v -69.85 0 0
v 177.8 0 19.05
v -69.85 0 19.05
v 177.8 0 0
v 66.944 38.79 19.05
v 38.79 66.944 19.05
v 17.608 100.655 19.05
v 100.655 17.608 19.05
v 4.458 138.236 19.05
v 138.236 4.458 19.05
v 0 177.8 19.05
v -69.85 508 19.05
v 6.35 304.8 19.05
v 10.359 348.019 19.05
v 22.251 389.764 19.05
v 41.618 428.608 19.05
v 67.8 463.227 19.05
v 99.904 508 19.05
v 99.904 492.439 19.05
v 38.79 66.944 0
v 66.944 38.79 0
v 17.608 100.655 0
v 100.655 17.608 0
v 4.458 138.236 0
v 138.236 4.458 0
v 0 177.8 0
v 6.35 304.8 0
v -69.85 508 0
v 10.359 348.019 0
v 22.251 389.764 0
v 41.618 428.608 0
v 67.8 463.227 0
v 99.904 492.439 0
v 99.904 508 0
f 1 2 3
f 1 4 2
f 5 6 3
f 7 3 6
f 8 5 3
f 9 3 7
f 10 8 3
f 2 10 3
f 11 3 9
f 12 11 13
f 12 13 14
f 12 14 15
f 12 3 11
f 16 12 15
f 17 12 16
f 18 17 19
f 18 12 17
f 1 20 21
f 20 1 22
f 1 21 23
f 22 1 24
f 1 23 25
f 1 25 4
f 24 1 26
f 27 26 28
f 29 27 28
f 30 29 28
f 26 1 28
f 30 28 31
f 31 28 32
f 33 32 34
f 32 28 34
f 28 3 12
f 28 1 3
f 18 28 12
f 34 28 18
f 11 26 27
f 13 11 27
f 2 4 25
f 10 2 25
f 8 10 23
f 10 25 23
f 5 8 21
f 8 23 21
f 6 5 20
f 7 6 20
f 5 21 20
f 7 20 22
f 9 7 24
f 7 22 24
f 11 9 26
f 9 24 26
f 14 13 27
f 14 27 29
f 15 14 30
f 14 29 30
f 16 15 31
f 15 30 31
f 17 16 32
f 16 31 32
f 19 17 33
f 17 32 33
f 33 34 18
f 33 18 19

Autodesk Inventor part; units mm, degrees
ref_plane "YZ Plane" through (0, 0, 0) normal (1, 0, 0) x (0, 1, 0)
ref_plane "XZ Plane" through (0, 0, 0) normal (0, 1, 0) x (-1, 0, 0)
ref_plane "XY Plane" through (0, 0, 0) normal (0, 0, 1) x (1, 0, 0)
sketch "Sketch1" plane through (0, 0, 0) normal (0, 0, 1) x (1, 0, 0)
  line L0 (0, 0) -> (609.6, 0) construction
  line L1 (609.6, 0) -> (609.6, 209.55)
  line L2 (609.6, 209.55) -> (0, 209.55) construction
  line L3 (0, 209.55) -> (0, 0) construction
  line L4 (0, 0) -> (304.8, 0) construction
  line L5 (304.8, 0) -> (304.8, 165.1) construction
  line L6 (304.8, 165.1) -> (0, 165.1) construction
  line L7 (0, 165.1) -> (0, 0) construction
  line L8 (0, 0) -> (165.1, 0) construction
  line L9 (165.1, 0) -> (165.1, 304.8) construction
  line L10 (165.1, 304.8) -> (0, 304.8) construction
  line L11 (0, 304.8) -> (0, 0) construction
  line L12 (0, 0) -> (177.8, 0) construction
  line L13 (177.8, 0) -> (177.8, 177.8) construction
  line L14 (177.8, 177.8) -> (0, 177.8) construction
  line L15 (0, 177.8) -> (0, 0) construction
  circle A0 centre (177.8, 177.8) radius 12.7
  line L16 (177.8, 177.8) -> (165.1, 177.8)
  line L17 (177.8, 177.8) -> (177.8, 165.1)
  line L18 (177.8, 177.8) -> (168.8197, 168.8197)
  line L19 (177.8, 177.8) -> (190.5, 177.8) construction
  line L20 (168.8197, 168.8197) -> (52.0764, 52.0764) construction
  line L21 (168.8197, 168.8197) -> (333.9197, 168.8197) construction
  line L22 (177.8, 165.1) -> (177.8, 0) construction
  line L23 (165.1, 177.8) -> (0, 177.8) construction
  arc A1 (0, 177.8) -> (177.8, 0) centre (177.8, 177.8) ccw
  line L24 (177.8, 177.8) -> (355.6, 177.8) construction
  line L25 (355.6, 177.8) -> (355.6, 193.675)
  line L26 (355.6, 193.675) -> (177.8, 193.675) construction
  line L27 (177.8, 193.675) -> (177.8, 177.8) construction
  circle A2 centre (355.6, 193.675) radius 12.7
  line L28 (355.6, 193.675) -> (482.6, 193.675) construction
  line L29 (482.6, 209.55) -> (355.6, 209.55) construction
  line L30 (355.6, 209.55) -> (355.6, 193.675) construction
  line L31 (177.8, 0) -> (609.6, 0)
  line L32 (177.8, 165.1) -> (355.6, 180.975)
  line L33 (165.1, 177.8) -> (165.1, 304.8) construction
  line L34 (165.1, 304.8) -> (241.3, 304.8) construction
  circle A3 centre (241.3, 304.8) radius 76.2
  circle A4 centre (177.8, 228.6) radius 12.7
  line L35 (177.8, 177.8) -> (177.8, 228.6)
  line L36 (241.3, 304.8) -> (195.4417, 365.656) construction
  line L37 (241.3, 304.8) -> (317.5, 304.8) construction
  line L38 (195.4417, 365.656) -> (354.1917, 365.656) construction
  line L39 (195.4417, 365.656) -> (99.9036, 492.4394) construction
  line L40 (195.4417, 365.656) -> (354.1917, 365.656) construction
  line L41 (165.1, 304.8) -> (0, 304.8) construction
  line L42 (241.3, 304.8) -> (169.6954, 330.8619) construction
  line L43 (241.3, 304.8) -> (317.5, 304.8) construction
  line L44 (169.6954, 330.8619) -> (20.5192, 385.1576) construction
  line L45 (177.8, 0) -> (408.0964, 0) construction
  line L46 (241.3, 304.8) -> (317.5, 304.8) construction
  line L47 (241.3, 304.8) -> (175.3089, 342.9) construction
  line L48 (241.3, 304.8) -> (317.5, 304.8) construction
  line L49 (175.3089, 342.9) -> (37.8273, 422.275) construction
  line L50 (190.5, 177.8) -> (393.7, 177.8) construction
  line L51 (609.6, 0) -> (-50.8, 0)
  line L52 (-50.8, 0) -> (-50.8, 508)
  line L53 (177.8, 0) -> (-50.8, 0)
  line L54 (-50.8, 492.4394) -> (-50.8, 508)
  line L55 (-50.8, 508) -> (99.9036, 508)
  line L56 (99.9036, 508) -> (99.9036, 492.4394)
  line L57 (355.6, 180.975) -> (609.6, 209.55)
  arc A5 (99.9036, 492.4394) -> (6.35, 304.8) centre (241.3, 304.8) ccw
  line L58 (0, 177.8) -> (6.35, 304.8)
  line L59 (0, 304.8) -> (0, 177.8) construction
  line L60 (6.35, 304.8) -> (0, 304.8) construction
  point P0 (165.2751, 230.7014)
  point P1 (172.7151, 216.9624)
  dimension "d16" = 25.4
  dimension "d0" = 609.6
  dimension "d1" = 209.55
  dimension "d2" = 304.8
  dimension "d3" = 165.1
  dimension "d4" = 165.1
  dimension "d5" = 304.8
  dimension "d6" = 177.8
  dimension "d7" = 177.8
  dimension "d8" = 25.4
  dimension "d9" = 12.7
  dimension "d10" = 135
  dimension "d11" = 165.1
  dimension "d12" = 135
  dimension "d13" = 165.1
  dimension "d14" = 177.8
  dimension "d15" = 15.875
  dimension "d17" = 127
  dimension "d20" = 127
  dimension "d21" = 76.2
  dimension "d22" = 152.4
  dimension "d23" = 25.4
  dimension "d24" = 50.8
  dimension "d26" = 127
  dimension "d33" = 158.75
  dimension "d34" = 127
  dimension "d35" = 160
  dimension "d36" = 158.75
  dimension "d37" = 180
  dimension "d45" = 150
  dimension "d46" = 158.75
  dimension "d47" = 180
  dimension "d72" = 660.4
  dimension "d73" = 508
  dimension "d74" = 90
  dimension "d77" = 150.7036
  dimension "d78" = 15.5606
extrude "Extrusion2" add sketch "Sketch1" along normal blind 19.05 contours A1 L51 L52 L55 L56 A5 L58
move faces "Move1" translate (-19.05, 0, 0) faces at (-50.8, 338.6667, 6.35)
